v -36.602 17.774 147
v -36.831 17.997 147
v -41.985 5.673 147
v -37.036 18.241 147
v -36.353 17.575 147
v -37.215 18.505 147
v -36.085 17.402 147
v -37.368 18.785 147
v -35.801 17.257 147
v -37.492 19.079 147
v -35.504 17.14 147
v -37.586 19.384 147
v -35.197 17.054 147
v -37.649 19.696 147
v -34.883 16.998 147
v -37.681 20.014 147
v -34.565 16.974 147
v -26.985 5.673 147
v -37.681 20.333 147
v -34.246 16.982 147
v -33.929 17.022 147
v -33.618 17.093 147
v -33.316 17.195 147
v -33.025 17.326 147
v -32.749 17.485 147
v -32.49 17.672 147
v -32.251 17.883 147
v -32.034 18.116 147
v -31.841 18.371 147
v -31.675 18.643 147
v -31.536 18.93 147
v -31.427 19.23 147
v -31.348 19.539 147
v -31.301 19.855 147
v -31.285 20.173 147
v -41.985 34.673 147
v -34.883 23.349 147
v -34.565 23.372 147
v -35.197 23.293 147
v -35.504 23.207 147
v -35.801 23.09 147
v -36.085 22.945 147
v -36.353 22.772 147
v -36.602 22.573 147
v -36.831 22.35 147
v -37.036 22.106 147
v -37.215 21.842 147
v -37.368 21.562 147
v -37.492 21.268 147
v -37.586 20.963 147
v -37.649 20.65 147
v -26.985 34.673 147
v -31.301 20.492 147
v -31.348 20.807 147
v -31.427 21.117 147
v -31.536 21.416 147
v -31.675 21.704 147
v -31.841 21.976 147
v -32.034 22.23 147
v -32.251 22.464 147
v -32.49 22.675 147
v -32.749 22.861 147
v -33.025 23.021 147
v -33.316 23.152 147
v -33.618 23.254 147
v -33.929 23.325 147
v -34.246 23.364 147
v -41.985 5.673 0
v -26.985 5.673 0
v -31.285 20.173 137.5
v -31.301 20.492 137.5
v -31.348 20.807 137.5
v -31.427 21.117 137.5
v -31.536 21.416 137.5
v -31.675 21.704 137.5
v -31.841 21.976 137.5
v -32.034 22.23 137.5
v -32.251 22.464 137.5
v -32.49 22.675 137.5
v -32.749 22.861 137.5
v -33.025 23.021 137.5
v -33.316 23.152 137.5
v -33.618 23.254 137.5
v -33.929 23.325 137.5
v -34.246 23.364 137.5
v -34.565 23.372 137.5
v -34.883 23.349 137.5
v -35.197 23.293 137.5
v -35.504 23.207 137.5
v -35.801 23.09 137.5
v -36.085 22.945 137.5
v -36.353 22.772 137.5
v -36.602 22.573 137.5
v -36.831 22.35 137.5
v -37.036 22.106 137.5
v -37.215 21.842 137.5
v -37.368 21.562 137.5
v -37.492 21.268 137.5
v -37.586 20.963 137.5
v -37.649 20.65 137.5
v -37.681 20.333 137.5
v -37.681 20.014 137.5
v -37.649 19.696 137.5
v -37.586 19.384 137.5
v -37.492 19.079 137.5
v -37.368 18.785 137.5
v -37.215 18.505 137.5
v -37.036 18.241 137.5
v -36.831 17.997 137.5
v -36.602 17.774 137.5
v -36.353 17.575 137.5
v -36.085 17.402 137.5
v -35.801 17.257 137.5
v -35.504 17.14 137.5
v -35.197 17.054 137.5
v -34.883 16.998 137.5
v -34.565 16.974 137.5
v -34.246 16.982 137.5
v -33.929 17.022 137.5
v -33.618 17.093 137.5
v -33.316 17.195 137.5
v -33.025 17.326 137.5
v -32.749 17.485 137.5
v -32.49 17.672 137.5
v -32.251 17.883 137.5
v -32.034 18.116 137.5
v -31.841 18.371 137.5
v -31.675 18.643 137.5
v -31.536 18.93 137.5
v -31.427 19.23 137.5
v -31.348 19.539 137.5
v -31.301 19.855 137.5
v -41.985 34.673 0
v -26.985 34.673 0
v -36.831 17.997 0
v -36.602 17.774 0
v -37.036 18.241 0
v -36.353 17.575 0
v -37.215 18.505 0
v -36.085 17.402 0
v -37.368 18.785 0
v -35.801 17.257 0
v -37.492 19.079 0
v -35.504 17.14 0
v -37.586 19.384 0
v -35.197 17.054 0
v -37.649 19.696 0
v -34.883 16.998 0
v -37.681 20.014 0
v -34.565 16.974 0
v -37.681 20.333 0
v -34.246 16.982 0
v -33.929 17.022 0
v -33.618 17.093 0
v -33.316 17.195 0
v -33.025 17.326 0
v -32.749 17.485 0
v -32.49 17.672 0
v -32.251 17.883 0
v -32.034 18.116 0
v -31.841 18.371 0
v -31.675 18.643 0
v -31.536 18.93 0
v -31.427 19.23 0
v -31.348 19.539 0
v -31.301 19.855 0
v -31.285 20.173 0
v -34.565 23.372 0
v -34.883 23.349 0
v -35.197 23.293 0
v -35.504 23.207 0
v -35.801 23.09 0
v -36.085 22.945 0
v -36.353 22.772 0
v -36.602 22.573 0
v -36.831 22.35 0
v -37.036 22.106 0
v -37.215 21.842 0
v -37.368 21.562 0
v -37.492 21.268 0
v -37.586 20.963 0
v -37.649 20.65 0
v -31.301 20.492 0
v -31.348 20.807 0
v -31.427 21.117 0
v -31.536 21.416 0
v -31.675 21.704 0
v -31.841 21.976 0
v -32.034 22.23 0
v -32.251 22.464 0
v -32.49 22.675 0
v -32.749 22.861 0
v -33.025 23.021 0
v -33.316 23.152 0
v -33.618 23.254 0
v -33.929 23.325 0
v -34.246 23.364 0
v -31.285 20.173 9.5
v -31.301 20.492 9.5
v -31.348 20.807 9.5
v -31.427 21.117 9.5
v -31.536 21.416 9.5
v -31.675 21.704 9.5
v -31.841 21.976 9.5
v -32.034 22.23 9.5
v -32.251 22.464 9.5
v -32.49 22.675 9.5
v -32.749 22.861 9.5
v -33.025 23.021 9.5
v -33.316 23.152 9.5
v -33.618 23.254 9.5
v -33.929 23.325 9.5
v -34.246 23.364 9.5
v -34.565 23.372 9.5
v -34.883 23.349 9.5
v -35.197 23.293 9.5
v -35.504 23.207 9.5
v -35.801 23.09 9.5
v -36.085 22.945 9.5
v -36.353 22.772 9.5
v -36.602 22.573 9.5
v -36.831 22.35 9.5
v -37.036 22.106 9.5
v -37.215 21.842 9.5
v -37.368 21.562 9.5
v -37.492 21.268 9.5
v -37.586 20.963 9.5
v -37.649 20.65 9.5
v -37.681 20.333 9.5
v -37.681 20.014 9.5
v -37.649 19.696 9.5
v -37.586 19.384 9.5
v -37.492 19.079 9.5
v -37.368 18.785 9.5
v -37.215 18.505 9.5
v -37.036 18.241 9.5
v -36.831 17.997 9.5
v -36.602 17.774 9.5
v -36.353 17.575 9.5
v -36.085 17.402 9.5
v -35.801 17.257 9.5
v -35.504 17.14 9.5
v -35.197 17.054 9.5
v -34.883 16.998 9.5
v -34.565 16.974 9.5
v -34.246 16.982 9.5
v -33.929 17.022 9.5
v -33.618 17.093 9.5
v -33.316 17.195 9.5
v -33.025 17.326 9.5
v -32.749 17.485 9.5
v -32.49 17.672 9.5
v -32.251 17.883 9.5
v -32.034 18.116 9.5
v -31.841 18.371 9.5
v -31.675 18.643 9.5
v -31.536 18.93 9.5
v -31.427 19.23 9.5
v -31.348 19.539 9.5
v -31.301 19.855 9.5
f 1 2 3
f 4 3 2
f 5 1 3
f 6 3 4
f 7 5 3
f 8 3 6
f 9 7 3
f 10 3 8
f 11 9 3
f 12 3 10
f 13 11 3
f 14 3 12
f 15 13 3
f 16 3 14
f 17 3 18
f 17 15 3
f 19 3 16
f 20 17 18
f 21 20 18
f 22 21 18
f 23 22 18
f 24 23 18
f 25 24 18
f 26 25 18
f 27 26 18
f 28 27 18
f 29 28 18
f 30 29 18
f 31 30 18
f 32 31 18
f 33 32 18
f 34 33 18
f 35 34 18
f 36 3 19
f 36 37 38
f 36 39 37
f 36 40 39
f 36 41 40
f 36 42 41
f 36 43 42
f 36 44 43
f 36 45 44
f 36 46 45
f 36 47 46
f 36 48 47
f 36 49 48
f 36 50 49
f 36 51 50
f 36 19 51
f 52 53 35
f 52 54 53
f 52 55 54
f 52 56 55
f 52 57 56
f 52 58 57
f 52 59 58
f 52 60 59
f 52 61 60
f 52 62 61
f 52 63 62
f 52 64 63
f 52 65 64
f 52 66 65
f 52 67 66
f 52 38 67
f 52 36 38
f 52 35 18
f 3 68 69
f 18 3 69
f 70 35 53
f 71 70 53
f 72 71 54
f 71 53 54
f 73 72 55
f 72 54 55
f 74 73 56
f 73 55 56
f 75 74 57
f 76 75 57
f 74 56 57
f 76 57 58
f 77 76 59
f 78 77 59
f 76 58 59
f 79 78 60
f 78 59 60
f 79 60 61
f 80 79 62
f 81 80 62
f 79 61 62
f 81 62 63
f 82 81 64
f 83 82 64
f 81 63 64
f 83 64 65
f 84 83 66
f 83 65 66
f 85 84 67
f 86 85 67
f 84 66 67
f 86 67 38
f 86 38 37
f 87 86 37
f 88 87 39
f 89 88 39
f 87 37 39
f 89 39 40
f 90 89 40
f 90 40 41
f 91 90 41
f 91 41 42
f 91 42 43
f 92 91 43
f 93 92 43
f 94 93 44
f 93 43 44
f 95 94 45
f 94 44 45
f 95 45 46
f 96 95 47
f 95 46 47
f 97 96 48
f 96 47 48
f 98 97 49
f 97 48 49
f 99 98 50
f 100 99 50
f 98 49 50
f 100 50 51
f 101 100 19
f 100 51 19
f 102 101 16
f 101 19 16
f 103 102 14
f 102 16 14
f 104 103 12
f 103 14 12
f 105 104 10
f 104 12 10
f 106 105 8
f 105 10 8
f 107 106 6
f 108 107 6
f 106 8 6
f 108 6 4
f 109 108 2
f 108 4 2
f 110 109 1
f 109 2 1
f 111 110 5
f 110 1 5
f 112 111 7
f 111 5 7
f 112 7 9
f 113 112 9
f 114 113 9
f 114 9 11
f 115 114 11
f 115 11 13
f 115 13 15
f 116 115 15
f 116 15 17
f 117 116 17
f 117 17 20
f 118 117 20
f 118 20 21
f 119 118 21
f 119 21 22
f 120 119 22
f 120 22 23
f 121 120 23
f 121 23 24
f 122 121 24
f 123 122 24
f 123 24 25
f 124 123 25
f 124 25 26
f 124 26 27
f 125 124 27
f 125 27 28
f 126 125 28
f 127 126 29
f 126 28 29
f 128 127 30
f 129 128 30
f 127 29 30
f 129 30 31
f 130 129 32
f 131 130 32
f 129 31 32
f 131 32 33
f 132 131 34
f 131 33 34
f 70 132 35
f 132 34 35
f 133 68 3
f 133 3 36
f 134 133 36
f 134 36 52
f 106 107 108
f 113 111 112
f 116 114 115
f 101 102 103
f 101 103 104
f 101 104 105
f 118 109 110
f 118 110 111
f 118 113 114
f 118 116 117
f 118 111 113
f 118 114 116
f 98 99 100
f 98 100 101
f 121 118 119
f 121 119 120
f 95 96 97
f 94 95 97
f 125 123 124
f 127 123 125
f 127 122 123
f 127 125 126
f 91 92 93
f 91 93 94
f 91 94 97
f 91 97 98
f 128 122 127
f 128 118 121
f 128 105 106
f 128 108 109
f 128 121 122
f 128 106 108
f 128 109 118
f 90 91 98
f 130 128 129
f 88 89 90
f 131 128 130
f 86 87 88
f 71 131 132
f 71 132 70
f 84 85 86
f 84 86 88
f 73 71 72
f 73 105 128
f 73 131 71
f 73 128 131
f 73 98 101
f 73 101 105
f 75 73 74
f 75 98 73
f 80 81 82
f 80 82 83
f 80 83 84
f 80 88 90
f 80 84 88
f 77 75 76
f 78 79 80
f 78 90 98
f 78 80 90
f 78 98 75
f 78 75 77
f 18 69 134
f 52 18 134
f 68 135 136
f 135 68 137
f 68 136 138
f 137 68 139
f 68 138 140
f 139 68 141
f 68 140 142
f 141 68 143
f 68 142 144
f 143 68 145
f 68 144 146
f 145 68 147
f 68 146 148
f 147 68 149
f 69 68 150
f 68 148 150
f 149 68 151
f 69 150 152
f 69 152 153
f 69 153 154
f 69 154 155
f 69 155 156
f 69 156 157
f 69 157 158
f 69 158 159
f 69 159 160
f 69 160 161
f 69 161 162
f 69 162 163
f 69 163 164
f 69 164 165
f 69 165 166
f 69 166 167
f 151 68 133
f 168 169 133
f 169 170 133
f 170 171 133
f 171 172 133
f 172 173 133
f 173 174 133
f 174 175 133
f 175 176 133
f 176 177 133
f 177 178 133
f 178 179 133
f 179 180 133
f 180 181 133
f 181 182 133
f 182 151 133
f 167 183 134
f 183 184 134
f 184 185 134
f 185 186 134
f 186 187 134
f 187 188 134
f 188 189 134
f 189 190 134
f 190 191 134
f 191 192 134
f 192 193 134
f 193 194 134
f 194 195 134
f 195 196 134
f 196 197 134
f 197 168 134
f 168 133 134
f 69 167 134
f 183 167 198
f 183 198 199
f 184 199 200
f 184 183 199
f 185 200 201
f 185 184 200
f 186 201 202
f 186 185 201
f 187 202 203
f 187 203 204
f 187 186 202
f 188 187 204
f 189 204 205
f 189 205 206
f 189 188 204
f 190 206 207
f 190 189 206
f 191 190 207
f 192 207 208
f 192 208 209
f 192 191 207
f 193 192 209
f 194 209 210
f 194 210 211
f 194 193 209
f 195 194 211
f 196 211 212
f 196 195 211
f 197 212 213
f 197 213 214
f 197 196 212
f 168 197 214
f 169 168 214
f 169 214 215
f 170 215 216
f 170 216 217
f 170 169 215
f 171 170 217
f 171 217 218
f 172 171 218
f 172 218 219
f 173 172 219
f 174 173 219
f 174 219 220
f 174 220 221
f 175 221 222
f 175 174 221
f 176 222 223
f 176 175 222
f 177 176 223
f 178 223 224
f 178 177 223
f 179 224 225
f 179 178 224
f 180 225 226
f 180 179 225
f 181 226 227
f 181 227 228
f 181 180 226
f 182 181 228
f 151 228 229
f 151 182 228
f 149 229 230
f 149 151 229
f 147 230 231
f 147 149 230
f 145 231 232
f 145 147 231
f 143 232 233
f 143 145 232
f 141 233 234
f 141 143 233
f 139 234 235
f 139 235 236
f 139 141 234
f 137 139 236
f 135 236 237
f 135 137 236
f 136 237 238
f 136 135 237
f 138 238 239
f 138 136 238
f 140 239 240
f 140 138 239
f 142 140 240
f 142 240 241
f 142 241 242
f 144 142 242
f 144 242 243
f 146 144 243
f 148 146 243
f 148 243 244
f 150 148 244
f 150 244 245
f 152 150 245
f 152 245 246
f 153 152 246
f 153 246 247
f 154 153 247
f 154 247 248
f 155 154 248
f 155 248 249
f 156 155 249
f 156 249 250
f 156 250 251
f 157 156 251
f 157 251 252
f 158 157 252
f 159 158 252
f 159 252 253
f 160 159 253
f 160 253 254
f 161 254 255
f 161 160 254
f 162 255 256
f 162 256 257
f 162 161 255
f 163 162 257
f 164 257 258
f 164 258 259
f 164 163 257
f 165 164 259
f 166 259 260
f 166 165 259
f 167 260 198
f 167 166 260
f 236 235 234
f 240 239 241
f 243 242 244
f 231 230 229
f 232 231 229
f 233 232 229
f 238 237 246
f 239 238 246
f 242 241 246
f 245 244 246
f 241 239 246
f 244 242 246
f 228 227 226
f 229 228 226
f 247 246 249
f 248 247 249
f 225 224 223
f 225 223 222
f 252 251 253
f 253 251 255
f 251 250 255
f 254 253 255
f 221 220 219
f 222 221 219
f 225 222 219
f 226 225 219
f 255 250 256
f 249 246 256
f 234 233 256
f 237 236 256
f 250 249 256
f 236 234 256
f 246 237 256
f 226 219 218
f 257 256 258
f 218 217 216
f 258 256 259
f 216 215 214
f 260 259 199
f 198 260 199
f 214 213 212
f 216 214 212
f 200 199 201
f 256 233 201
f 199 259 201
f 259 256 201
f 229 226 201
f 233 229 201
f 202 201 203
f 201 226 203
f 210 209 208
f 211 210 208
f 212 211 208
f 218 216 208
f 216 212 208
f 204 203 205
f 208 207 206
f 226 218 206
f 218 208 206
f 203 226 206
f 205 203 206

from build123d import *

# Parameters (mm, degrees)
SKETCH1_W           = 15
SKETCH1_H           = 29
BOSS_EXTRUDE1_DEPTH = 147
SKETCH2_R           = 3.2
CUT_EXTRUDE1_DEPTH  = 9.5


with BuildPart() as part:
    # Sketch1 → Boss-Extrude1 (new body)
    with BuildSketch(Plane.XY):
        with Locations((-34.484924623, 20.173366834)):
            Rectangle(SKETCH1_W, SKETCH1_H)
    extrude(amount=BOSS_EXTRUDE1_DEPTH)

    # Sketch2 → Cut-Extrude1 (cut)
    with BuildSketch(Plane.XY.offset(147)):
        with Locations((-34.484924623, 20.173366834)):
            Circle(SKETCH2_R)
    cut_extrude1 = extrude(amount=-CUT_EXTRUDE1_DEPTH, mode=Mode.SUBTRACT)

    # Mirror1: Cut-Extrude1 across plane
    add(cut_extrude1.mirror(Plane.XY.offset(73.5)), mode=Mode.SUBTRACT)


solid = part.part
